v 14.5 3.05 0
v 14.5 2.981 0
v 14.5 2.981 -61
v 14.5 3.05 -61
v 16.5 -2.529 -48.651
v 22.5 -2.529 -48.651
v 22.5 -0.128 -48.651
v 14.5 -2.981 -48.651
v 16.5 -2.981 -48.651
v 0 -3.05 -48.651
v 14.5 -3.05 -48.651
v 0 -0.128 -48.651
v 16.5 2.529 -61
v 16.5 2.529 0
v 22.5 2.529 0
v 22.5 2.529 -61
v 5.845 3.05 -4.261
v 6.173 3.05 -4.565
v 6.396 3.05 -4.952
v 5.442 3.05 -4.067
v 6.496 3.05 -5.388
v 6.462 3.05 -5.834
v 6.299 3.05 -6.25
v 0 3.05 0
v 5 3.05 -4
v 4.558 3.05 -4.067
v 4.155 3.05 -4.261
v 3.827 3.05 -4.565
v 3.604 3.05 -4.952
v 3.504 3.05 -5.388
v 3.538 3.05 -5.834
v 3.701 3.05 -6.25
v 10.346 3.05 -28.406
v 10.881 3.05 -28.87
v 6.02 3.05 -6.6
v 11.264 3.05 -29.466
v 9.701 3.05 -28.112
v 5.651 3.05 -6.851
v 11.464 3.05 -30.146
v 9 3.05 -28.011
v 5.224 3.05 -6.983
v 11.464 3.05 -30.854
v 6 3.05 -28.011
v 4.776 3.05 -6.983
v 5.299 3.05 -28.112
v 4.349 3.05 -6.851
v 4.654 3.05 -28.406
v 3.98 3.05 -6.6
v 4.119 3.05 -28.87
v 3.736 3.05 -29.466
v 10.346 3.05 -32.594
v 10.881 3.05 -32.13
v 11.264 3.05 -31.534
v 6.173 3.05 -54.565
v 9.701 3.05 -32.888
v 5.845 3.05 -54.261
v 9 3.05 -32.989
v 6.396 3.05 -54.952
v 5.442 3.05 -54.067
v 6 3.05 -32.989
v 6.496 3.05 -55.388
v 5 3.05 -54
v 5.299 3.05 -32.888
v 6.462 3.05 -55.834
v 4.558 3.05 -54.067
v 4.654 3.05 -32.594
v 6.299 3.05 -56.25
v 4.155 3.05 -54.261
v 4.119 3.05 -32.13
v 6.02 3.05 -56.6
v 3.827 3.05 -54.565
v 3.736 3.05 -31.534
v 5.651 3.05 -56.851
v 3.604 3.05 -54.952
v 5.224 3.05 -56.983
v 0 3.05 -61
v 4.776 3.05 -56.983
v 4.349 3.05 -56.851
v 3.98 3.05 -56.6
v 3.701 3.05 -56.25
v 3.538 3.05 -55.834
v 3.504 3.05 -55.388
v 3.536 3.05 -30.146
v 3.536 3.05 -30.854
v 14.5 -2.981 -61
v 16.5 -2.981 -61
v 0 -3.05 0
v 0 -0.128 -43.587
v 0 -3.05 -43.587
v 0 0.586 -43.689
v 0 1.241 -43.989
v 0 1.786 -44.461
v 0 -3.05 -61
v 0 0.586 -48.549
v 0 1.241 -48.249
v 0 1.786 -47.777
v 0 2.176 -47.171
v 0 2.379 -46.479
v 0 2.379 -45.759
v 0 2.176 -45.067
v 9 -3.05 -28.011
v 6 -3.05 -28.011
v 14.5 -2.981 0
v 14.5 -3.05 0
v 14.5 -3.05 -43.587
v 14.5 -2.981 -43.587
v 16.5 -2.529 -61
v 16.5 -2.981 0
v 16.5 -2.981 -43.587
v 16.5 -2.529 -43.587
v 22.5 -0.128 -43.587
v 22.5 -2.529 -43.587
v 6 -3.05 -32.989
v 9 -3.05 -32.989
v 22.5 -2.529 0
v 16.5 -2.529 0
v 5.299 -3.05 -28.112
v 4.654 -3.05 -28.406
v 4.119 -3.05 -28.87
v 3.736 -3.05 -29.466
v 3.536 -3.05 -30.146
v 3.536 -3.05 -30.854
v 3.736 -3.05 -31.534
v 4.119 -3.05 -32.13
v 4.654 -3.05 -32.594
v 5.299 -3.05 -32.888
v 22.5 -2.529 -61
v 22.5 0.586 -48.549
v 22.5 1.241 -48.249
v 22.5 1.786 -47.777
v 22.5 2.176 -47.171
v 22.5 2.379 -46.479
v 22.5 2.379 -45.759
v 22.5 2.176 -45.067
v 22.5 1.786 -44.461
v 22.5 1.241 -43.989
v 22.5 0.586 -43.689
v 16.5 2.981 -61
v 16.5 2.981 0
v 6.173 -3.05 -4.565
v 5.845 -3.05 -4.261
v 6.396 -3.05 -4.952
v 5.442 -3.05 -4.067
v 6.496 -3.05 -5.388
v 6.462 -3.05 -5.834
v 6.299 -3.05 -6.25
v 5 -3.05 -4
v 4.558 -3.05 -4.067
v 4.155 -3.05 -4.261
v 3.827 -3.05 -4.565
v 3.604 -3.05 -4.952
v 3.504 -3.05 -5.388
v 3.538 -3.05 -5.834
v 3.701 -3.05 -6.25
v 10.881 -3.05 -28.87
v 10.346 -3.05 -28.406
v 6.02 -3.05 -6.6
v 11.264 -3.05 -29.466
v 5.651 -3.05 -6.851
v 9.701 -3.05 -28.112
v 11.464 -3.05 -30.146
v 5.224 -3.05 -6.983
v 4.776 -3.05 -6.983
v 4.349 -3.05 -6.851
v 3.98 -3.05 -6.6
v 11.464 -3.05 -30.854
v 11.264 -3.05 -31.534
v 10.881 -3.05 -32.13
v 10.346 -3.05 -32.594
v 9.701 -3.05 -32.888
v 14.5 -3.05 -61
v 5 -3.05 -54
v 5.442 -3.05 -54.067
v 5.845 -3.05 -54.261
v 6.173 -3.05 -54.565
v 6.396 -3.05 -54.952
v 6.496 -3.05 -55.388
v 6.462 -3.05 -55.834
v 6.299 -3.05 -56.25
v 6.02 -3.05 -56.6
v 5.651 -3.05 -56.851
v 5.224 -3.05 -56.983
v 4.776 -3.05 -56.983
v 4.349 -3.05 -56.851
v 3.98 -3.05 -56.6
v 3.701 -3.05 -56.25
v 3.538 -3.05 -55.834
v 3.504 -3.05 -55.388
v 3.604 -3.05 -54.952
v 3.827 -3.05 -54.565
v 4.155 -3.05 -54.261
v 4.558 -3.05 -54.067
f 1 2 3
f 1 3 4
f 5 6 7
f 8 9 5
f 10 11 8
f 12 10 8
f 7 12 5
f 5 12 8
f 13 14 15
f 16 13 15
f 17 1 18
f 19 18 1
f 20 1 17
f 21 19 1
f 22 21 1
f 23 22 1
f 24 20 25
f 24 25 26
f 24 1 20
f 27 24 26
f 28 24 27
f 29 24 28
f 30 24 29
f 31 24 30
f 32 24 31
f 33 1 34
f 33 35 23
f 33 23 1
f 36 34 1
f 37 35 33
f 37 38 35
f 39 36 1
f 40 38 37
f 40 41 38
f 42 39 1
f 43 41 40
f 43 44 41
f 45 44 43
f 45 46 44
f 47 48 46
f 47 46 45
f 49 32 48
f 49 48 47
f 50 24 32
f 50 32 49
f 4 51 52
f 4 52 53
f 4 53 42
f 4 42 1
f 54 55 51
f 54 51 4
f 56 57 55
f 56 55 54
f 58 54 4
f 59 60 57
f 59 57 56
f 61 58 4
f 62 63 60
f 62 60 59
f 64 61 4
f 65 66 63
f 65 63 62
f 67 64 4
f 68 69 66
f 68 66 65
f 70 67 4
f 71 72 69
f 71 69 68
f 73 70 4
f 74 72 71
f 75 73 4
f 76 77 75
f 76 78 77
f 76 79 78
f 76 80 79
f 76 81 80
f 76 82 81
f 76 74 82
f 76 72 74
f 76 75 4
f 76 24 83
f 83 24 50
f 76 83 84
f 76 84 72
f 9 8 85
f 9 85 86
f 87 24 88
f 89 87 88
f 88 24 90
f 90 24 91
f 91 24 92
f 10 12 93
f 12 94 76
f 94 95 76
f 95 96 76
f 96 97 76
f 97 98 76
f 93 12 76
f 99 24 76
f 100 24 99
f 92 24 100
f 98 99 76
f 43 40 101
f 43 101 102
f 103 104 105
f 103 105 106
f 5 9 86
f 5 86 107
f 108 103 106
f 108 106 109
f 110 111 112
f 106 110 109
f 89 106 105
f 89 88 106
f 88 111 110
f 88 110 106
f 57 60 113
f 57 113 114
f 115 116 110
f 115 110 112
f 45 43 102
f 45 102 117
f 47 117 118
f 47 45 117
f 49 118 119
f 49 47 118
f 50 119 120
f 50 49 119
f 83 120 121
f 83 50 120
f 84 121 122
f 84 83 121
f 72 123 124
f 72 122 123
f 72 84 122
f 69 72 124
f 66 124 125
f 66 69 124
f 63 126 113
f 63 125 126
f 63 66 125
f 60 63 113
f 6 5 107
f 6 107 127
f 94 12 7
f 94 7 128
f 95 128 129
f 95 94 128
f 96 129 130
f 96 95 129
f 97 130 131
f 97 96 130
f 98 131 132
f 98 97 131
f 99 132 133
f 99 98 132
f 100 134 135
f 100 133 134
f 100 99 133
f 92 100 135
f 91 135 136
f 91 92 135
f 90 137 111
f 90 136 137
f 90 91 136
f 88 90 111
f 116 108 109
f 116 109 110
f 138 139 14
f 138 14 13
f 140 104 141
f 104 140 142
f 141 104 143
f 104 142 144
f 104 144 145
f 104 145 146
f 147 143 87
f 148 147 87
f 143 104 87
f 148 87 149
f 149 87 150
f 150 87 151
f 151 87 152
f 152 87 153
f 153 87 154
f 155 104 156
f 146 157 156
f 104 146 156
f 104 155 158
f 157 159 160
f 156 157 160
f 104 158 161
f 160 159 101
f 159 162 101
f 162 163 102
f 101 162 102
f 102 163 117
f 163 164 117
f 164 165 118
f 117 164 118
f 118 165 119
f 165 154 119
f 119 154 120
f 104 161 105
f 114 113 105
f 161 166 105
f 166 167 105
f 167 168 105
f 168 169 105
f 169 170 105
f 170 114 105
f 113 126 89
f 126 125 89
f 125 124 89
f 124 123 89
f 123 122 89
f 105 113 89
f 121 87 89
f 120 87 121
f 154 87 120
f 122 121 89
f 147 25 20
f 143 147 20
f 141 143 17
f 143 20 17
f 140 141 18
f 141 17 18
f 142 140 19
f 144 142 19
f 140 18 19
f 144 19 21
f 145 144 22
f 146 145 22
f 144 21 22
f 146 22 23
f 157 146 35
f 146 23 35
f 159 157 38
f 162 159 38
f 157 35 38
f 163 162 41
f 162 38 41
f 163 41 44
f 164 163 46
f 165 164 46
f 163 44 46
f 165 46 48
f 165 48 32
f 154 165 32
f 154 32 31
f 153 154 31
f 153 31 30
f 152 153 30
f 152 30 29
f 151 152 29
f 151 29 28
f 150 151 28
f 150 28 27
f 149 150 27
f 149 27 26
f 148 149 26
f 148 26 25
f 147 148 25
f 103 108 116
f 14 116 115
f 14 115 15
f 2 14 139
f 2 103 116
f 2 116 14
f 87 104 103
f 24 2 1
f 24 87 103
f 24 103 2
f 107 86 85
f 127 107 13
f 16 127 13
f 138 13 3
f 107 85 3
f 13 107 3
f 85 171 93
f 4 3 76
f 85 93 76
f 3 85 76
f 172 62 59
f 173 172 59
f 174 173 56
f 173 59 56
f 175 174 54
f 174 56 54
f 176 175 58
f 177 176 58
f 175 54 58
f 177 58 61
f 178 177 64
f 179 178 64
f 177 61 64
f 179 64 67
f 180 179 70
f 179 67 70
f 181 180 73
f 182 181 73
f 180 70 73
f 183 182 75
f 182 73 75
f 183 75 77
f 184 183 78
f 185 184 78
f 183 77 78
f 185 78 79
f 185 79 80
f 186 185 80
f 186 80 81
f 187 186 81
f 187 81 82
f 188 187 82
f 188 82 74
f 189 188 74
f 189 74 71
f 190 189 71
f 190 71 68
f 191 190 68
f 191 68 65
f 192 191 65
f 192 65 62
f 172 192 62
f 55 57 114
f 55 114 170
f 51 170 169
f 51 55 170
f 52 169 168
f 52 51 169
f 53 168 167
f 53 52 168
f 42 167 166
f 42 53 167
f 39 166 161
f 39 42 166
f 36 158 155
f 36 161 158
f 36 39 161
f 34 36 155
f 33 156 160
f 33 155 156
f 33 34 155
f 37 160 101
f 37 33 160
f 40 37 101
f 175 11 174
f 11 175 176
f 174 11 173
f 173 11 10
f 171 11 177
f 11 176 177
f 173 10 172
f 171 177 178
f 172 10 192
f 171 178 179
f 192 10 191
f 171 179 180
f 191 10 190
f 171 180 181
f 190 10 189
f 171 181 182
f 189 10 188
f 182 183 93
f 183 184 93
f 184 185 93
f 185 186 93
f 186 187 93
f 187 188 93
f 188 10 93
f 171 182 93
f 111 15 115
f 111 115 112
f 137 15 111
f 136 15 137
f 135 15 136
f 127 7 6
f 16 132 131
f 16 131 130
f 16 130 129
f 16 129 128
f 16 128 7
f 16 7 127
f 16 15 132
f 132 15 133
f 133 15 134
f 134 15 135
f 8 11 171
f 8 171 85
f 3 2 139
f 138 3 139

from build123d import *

# Parameters (mm, degrees)
SKETCH1_W           = 61
SKETCH1_H           = 6.1
BOSS_EXTRUDE1_DEPTH = 22.5
SKETCH2_OUTSIDE_W   = 76.06
SKETCH2_OUTSIDE_H   = 21.16
SKETCH2_OUTSIDE_W_2 = 61
SKETCH2_OUTSIDE_H_2 = 5.1952
CUT_EXTRUDE1_DEPTH  = 6
CUT_EXTRUDE3_DEPTH  = 23.5
CUT_EXTRUDE4_DEPTH  = 7.1
SKETCH7_R           = 1.5
CUT_EXTRUDE5_DEPTH  = 7.1
SKETCH8_W           = 2
SKETCH8_H           = 0.06858
SKETCH8_W_2         = 6
CUT_EXTRUDE6_DEPTH  = 62


with BuildPart() as part:
    # Sketch1 → Boss-Extrude1 (new body)
    with BuildSketch(Plane(origin=(0, 0, 0), x_dir=(0, 0, -1), z_dir=(1, 0, 0))):
        with Locations((30.5, 0)):
            Rectangle(SKETCH1_W, SKETCH1_H)
    extrude(amount=BOSS_EXTRUDE1_DEPTH)

    # Sketch2 outside → Cut-Extrude1 (cut)
    with BuildSketch(Plane(origin=(22.5, 0, 0), x_dir=(0, 0, -1), z_dir=(1, 0, 0))):
        with Locations((30.5, 0)):
            Rectangle(SKETCH2_OUTSIDE_W, SKETCH2_OUTSIDE_H)
        with Locations((30.5, 0)):
            Rectangle(SKETCH2_OUTSIDE_W_2, SKETCH2_OUTSIDE_H_2, mode=Mode.SUBTRACT)
    extrude(amount=-CUT_EXTRUDE1_DEPTH, mode=Mode.SUBTRACT)

    # Sketch5 → Cut-Extrude3 (cut, through all)
    with BuildSketch(Plane.ZY):
        with BuildLine():
            Line((-43.5866, -0.1278), (-43.5866, -3.05))
            Line((-43.5866, -3.05), (-48.6514, -3.05))
            Line((-48.6514, -3.05), (-48.6514, -0.1278))
            ThreePointArc((-48.6514, -0.1278), (-46.119, 2.4046), (-43.5866, -0.1278))
        make_face()
    extrude(amount=-CUT_EXTRUDE3_DEPTH, mode=Mode.SUBTRACT)

    # Sketch6 → Cut-Extrude4 (cut, through all)
    with BuildSketch(Plane(origin=(0, 3.05, 0), x_dir=(1, 0, 0), z_dir=(0, 1, 0))):
        with BuildLine():
            Line((6, 32.9892), (9, 32.9892))
            ThreePointArc((9, 32.9892), (11.4892, 30.5), (9, 28.0108))
            Line((9, 28.0108), (6, 28.0108))
            ThreePointArc((6, 28.0108), (3.5108, 30.5), (6, 32.9892))
        make_face()
    extrude(amount=-CUT_EXTRUDE4_DEPTH, mode=Mode.SUBTRACT)

    # Sketch7 → Cut-Extrude5 (cut, through all)
    with BuildSketch(Plane(origin=(0, 3.05, 0), x_dir=(1, 0, 0), z_dir=(0, 1, 0))):
        with Locations(Location((5, 55.5, 0), (0, 0, 270))):  # turned: the seam where the file's is
            Circle(SKETCH7_R)
        with Locations(Location((5, 5.5, 0), (0, 0, 270))):  # turned: the seam where the file's is
            Circle(SKETCH7_R)
    extrude(amount=-CUT_EXTRUDE5_DEPTH, mode=Mode.SUBTRACT)

    # Sketch8 → Cut-Extrude6 (cut, through all)
    with BuildSketch(Plane.XY):
        with Locations((15.5, -3.01571)):
            Rectangle(SKETCH8_W, SKETCH8_H)
        with Locations((19.5, -2.56331)):
            Rectangle(SKETCH8_W_2, SKETCH8_H)
        with Locations((19.5, 2.56331)):
            Rectangle(SKETCH8_W_2, SKETCH8_H)
        with Locations((15.5, 3.01571)):
            Rectangle(SKETCH8_W, SKETCH8_H)
    extrude(amount=-CUT_EXTRUDE6_DEPTH, mode=Mode.SUBTRACT)


solid = part.part
